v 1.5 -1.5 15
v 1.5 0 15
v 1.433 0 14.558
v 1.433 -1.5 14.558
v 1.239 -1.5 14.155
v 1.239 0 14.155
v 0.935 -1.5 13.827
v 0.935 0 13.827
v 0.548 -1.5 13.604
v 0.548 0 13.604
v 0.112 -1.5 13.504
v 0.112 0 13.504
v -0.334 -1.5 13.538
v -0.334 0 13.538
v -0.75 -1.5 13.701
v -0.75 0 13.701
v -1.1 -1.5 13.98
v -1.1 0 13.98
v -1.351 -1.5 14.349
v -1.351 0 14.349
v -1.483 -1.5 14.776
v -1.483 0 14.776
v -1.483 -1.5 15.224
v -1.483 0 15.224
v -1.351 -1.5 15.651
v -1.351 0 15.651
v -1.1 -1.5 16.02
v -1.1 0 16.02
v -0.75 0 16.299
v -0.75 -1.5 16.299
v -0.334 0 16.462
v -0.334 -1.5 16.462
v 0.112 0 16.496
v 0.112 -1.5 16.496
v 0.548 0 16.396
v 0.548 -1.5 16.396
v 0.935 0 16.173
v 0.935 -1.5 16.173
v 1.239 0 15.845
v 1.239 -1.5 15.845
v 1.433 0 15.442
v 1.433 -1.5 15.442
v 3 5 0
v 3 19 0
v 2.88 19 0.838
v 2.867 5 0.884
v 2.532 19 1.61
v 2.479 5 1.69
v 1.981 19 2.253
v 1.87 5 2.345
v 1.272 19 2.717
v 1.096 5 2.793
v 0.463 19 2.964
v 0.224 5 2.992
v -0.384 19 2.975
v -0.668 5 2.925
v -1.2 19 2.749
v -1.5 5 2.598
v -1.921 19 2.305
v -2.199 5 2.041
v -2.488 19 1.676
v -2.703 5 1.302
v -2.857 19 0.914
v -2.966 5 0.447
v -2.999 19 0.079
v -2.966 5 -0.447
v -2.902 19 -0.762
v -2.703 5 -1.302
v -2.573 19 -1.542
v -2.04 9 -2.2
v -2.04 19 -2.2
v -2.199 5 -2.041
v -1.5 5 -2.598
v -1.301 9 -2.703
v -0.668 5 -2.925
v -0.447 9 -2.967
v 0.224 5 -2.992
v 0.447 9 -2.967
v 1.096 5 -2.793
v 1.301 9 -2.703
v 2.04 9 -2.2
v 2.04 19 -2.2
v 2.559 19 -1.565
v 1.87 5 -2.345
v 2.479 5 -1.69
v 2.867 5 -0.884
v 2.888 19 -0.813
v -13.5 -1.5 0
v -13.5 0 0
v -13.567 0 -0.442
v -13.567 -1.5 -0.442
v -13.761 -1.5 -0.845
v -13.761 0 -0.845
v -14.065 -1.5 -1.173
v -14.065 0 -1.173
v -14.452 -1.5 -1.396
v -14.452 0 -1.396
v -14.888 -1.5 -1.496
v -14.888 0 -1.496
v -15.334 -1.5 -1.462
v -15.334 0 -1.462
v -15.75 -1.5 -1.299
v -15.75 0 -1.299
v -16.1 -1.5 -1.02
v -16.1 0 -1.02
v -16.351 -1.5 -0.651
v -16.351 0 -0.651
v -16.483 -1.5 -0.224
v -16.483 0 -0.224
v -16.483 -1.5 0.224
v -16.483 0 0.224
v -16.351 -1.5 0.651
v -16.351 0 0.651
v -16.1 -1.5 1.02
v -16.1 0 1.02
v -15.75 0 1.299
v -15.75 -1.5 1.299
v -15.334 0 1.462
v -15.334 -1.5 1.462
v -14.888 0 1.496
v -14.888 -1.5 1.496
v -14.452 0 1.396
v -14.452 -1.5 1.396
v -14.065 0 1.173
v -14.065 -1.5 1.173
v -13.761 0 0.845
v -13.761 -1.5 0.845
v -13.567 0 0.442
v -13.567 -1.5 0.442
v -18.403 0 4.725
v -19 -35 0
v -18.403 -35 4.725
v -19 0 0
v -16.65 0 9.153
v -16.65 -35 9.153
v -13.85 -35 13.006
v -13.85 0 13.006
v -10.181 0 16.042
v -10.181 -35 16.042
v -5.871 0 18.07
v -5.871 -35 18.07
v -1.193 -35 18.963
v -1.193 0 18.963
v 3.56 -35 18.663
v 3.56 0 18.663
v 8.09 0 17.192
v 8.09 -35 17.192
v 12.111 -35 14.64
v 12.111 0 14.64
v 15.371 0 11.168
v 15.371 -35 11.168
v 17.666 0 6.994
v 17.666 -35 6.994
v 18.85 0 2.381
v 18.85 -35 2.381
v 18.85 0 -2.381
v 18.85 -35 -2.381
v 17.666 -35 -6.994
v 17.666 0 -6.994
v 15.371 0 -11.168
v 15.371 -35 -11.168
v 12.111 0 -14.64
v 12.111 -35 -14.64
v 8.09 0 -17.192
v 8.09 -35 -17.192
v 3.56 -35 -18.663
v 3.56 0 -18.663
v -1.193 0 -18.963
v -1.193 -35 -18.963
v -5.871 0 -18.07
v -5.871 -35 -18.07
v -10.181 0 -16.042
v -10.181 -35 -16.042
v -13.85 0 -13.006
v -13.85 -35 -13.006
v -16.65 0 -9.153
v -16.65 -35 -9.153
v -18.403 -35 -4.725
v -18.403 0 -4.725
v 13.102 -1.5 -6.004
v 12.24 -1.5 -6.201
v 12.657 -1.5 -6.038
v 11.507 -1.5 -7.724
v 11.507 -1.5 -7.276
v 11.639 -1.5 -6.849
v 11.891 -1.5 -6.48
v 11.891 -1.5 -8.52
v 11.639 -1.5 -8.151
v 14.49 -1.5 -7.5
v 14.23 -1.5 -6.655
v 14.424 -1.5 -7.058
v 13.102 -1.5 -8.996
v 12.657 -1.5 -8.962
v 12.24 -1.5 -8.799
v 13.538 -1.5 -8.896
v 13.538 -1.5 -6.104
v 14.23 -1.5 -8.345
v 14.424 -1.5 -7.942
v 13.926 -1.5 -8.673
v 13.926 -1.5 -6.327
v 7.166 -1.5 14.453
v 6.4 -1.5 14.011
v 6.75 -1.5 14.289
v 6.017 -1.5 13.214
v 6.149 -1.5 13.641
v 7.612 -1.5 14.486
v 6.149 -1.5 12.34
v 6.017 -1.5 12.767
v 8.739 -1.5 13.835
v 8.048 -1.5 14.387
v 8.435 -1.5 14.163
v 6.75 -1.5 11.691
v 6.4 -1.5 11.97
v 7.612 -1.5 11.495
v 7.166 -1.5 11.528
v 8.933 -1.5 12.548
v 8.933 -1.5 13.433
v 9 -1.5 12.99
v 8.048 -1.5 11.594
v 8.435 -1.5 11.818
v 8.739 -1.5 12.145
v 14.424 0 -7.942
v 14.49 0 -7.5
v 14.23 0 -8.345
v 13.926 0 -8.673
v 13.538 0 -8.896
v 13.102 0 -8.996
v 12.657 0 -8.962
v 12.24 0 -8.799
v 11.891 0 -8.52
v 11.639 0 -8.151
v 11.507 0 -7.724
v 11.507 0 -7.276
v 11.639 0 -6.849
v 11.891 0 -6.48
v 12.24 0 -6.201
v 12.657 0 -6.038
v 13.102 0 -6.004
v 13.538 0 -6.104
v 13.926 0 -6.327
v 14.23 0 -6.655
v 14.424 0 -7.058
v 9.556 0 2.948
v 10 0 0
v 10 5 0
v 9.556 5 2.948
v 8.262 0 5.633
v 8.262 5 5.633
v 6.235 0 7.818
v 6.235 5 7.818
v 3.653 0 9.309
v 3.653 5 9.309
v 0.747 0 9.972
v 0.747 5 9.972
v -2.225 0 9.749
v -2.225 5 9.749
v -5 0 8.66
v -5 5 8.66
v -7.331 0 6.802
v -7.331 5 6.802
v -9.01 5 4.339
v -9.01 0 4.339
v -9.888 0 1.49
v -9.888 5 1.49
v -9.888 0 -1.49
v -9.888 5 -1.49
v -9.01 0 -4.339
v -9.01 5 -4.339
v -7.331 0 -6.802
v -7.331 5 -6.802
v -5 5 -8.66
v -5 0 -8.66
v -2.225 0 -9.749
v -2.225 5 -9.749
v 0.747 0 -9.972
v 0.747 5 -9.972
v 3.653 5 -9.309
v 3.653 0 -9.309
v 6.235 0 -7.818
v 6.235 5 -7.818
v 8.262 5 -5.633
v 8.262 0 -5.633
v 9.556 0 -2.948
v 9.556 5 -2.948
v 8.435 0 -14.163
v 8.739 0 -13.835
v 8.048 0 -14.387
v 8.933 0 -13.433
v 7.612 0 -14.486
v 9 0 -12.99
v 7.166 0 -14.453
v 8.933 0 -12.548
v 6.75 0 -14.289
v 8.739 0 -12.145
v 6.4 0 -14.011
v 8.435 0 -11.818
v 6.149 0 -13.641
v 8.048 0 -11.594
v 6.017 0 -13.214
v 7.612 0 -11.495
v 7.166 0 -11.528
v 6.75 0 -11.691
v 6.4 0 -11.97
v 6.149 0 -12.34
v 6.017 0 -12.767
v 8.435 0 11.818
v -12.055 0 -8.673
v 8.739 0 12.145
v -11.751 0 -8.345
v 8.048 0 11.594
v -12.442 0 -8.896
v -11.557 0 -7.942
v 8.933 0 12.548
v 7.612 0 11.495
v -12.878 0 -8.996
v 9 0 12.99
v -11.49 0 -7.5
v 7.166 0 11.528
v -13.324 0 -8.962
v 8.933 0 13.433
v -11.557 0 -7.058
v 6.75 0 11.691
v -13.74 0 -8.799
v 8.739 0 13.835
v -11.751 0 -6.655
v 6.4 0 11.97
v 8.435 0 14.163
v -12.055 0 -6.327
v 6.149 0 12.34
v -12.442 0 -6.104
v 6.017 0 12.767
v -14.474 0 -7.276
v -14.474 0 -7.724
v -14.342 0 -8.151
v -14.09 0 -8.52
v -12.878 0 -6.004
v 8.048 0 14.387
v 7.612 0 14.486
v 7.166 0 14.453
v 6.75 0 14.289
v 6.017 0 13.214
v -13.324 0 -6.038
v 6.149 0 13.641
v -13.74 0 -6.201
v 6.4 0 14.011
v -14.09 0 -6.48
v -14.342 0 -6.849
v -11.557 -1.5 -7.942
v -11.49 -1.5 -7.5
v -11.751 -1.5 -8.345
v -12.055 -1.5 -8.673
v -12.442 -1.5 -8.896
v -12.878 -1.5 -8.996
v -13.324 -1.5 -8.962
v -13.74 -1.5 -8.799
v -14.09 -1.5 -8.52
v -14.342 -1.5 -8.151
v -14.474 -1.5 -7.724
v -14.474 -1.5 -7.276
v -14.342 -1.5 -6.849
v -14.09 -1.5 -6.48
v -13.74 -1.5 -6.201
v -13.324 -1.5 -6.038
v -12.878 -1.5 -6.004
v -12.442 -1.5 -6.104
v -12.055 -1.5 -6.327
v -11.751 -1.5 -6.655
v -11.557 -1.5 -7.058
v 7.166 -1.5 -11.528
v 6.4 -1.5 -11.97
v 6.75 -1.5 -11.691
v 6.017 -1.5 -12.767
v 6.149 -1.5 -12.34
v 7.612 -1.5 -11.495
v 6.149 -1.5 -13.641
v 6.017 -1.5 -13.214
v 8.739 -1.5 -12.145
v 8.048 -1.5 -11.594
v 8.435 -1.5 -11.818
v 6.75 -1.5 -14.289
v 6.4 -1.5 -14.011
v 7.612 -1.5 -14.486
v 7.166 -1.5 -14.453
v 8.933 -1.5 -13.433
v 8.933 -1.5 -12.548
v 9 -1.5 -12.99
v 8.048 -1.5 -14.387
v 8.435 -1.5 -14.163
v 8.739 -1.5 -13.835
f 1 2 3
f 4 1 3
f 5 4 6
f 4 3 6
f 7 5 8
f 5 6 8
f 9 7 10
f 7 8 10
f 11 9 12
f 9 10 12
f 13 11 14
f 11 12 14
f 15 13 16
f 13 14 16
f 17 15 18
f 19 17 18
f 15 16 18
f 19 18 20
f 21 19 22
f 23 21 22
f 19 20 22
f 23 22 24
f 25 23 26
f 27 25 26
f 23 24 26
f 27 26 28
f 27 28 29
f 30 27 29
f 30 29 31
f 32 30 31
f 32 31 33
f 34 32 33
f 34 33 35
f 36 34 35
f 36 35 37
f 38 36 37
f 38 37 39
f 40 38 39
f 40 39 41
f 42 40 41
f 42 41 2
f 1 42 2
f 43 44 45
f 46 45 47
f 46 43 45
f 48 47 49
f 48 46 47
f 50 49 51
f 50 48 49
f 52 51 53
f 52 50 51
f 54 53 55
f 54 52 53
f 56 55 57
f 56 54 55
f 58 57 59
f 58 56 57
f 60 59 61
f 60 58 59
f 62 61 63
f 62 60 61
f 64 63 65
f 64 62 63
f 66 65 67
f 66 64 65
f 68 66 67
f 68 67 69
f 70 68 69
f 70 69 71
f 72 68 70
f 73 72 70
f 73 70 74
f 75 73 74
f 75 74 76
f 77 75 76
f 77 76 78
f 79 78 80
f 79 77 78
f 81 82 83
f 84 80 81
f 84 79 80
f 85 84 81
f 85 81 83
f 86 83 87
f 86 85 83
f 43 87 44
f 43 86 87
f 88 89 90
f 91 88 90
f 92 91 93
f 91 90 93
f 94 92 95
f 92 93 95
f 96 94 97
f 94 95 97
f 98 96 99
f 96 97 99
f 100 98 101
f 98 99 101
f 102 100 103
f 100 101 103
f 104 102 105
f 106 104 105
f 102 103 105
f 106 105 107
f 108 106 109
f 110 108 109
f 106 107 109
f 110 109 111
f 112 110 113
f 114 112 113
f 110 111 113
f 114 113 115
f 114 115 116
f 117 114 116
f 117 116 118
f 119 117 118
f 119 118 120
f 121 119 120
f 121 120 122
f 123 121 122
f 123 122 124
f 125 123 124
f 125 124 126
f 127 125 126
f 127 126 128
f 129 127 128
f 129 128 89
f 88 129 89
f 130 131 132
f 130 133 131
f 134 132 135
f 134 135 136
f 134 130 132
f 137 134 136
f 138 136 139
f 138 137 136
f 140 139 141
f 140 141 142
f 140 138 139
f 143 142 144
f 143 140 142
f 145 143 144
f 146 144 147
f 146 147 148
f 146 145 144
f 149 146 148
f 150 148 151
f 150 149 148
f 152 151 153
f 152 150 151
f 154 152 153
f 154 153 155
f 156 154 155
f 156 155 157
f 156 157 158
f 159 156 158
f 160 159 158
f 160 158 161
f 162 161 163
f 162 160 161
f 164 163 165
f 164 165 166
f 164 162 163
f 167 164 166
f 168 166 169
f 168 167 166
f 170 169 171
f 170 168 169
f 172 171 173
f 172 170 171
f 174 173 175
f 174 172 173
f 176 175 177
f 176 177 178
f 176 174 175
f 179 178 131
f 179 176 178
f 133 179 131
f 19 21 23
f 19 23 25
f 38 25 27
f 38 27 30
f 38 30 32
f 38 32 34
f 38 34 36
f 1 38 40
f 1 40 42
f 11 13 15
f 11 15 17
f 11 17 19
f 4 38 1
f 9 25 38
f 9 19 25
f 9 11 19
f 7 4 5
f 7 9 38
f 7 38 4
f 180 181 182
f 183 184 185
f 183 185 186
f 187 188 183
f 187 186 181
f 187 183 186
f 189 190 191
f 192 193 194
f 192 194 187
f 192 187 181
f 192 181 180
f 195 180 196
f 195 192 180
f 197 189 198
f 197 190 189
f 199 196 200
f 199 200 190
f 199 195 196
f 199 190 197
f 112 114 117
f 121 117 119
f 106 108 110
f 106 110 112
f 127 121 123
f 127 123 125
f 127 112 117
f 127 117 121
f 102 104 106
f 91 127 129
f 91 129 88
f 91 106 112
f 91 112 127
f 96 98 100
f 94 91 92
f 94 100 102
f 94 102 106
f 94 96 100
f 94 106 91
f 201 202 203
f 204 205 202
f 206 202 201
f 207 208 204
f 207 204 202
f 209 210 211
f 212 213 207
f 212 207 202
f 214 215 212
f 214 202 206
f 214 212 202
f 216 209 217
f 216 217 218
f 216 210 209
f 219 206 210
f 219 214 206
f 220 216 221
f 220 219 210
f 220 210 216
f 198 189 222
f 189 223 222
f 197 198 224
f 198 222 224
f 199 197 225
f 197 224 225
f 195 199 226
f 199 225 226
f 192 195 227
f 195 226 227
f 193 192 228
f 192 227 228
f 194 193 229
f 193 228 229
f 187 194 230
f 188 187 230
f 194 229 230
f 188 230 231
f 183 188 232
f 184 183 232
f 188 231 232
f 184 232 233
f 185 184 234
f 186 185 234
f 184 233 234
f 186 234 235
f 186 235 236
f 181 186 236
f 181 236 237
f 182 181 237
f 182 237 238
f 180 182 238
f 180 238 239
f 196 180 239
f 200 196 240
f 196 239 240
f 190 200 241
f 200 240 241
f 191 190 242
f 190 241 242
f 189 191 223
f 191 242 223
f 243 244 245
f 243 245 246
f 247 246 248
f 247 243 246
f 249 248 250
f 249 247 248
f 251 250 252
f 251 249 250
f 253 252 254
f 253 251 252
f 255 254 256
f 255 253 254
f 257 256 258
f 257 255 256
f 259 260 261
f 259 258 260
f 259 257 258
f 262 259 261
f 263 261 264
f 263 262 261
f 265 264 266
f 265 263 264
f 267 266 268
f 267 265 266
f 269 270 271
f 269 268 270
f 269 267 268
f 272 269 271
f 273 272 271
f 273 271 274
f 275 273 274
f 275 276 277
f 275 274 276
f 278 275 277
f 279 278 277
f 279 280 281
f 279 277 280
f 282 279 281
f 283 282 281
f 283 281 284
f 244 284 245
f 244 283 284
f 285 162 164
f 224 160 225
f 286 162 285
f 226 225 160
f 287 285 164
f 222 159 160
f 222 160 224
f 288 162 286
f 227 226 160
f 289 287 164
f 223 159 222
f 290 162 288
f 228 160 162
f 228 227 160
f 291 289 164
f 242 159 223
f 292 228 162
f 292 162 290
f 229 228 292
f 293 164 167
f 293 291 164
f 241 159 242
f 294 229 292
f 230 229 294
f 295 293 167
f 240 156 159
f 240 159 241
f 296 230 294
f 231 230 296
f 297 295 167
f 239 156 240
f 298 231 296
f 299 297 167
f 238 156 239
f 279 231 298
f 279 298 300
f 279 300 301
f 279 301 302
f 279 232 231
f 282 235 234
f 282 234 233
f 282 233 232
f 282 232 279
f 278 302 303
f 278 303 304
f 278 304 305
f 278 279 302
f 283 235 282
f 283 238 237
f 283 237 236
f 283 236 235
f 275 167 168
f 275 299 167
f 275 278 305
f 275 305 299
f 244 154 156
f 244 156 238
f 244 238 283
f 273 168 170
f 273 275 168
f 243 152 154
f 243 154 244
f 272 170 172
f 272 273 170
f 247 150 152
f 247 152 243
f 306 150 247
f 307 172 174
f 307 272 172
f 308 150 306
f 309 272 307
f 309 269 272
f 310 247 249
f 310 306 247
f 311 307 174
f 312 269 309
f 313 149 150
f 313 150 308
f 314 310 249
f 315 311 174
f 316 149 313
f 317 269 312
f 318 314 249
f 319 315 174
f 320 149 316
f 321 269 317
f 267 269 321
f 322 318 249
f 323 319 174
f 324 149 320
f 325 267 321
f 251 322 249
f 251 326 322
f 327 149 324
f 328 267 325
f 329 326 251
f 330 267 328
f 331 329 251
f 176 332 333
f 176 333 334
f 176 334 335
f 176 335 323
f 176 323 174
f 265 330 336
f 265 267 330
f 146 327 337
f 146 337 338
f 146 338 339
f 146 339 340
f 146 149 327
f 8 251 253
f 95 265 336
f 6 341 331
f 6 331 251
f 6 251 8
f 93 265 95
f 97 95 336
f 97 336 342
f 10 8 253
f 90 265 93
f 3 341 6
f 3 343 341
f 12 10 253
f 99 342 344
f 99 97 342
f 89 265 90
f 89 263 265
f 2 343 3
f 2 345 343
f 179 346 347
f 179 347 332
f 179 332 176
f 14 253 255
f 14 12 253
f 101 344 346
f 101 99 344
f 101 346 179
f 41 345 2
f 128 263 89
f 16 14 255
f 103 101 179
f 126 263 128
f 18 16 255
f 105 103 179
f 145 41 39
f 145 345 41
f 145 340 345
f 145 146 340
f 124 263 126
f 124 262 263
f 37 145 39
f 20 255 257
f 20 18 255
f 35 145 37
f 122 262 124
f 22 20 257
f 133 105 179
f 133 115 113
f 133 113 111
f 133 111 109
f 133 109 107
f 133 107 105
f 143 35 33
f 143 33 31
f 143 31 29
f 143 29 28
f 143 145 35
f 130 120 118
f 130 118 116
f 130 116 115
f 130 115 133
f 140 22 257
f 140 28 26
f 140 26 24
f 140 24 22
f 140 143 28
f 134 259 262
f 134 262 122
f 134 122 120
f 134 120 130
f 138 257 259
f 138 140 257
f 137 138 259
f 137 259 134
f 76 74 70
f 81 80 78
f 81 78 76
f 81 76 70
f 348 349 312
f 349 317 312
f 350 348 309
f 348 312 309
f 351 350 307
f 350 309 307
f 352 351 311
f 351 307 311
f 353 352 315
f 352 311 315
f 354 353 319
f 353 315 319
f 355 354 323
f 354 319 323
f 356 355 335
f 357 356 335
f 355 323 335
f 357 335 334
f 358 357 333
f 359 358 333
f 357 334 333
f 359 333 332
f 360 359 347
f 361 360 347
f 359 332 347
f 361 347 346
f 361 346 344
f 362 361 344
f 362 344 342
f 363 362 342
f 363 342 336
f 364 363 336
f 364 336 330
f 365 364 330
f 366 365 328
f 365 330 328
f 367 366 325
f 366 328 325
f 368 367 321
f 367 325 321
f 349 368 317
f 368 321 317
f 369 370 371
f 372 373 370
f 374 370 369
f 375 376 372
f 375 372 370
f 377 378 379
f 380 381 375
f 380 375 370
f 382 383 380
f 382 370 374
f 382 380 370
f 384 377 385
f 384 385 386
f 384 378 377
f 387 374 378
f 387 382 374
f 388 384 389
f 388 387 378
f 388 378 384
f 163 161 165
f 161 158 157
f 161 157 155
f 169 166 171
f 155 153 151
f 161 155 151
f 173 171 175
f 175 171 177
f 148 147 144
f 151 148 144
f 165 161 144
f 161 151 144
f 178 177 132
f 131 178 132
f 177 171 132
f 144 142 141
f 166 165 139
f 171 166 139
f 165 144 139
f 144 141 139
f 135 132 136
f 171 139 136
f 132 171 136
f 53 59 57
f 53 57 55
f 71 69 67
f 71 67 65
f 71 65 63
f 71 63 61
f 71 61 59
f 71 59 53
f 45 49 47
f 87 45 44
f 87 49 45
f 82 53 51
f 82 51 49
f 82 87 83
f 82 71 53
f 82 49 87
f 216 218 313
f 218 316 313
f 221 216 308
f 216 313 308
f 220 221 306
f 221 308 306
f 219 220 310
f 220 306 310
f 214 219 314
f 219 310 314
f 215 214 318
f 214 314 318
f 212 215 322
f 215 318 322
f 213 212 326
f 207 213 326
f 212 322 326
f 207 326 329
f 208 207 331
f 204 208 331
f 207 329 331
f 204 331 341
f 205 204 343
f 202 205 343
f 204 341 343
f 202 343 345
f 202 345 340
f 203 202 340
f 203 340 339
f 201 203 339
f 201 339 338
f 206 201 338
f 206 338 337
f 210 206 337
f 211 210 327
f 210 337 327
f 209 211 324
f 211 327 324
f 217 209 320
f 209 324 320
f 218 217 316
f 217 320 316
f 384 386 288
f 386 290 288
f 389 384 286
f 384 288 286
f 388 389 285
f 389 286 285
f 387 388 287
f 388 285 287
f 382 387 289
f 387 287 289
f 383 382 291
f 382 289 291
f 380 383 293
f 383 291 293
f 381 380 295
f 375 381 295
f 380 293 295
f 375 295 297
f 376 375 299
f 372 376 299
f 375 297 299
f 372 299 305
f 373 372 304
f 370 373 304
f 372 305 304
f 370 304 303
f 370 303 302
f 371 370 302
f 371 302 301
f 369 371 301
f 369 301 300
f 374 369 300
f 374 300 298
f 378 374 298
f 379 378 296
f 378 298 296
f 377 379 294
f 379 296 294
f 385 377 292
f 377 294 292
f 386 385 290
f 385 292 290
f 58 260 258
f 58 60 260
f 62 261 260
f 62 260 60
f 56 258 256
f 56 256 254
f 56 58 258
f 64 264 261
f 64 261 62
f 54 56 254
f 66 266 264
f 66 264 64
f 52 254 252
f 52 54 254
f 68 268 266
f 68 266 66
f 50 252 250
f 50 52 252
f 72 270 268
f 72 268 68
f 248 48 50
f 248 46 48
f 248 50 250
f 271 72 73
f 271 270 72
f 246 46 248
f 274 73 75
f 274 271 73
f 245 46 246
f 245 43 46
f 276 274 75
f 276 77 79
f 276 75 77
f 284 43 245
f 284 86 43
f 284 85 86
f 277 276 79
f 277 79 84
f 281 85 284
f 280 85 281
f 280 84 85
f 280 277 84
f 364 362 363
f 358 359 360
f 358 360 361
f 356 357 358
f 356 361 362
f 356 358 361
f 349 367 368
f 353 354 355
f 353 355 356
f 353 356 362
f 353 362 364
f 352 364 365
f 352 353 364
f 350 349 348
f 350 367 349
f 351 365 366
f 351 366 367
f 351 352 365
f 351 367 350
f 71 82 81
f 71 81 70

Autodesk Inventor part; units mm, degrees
ref_plane "YZ Plane" through (0, 0, 0) normal (1, 0, 0) x (0, 1, 0)
ref_plane "XZ Plane" through (0, 0, 0) normal (0, 1, 0) x (-1, 0, 0)
ref_plane "XY Plane" through (0, 0, 0) normal (0, 0, 1) x (1, 0, 0)
sketch "草图1" plane through (0, 0, 0) normal (0, 1, 0) x (-1, 0, 0)
  circle A0 centre (0, 0) radius 19
  circle A1 centre (0, 0) radius 10
  dimension "d0" = 38
  dimension "d1" = 20
extrude "拉伸1" add sketch "草图1" against normal blind 35 contours A0 | A1
sketch "草图2" plane through (0, 0, 0) normal (0, 1, 0) x (1, 0, 0)
  circle A0 centre (0, 0) radius 10
  circle A1 centre (0, 0) radius 15
  circle A2 centre (-15, 0) radius 1.5
  circle A3 centre (7.5, -12.9904) radius 1.5
  circle A4 centre (7.5, 12.9904) radius 1.5
  line L0 (0, 0) -> (-12.9904, 7.5)
  line L1 (0, 0) -> (15, 0) construction
  circle A5 centre (-12.9904, 7.5) radius 1.5
  circle A6 centre (0, -15) radius 1.5
  circle A7 centre (12.9904, 7.5) radius 1.5
  dimension "d4" = 20
  dimension "d5" = 30
  dimension "d6" = 3
  dimension "d9" = 360
  dimension "d11" = 150
  dimension "d12" = 3
  dimension "d15" = 360
extrude "拉伸2" cut sketch "草图2" against normal blind 1.5 contours A5 A1 L0 | L0 A1 A5 | A1 A5 | A2 A1 | A1 A2 | A4 A1 | A1 A4 | A6 A1 | A1 A6 | A7 A1 | A1 A7 | A3 A1 | A1 A3
sketch "草图3" plane through (0, 0, 0) normal (0, 1, 0) x (1, 0, 0)
  circle A0 centre (0, 0) radius 10
  dimension "d19" = 20
extrude "拉伸3" add sketch "草图3" along normal blind 5
sketch "草图4" plane through (0, 5, 0) normal (0, 1, 0) x (1, 0, 0)
  circle A0 centre (0, 0) radius 3
  dimension "d22" = 6
extrude "拉伸4" add sketch "草图4" along normal blind 14
sketch "草图5" plane through (0, 19, 0) normal (0, 1, 0) x (1, 0, 0)
  circle A0 centre (0, 0) radius 3 projected
  line L0 (0, -3) -> (0, 2.2)
  line L1 (0, 2.2) -> (-2.0396, 2.2)
  line L2 (0, 2.2) -> (2.0396, 2.2)
  dimension "d25" = 5.2
extrude "拉伸5" cut sketch "草图5" against normal blind 10 contours L2 L1 A0
thread "螺纹1" size "M3x0.5" class "6H" standard "ANSI Metric M Profile" length 1.5
thread "螺纹2" size "M3x0.5" class "6H" standard "ANSI Metric M Profile" length 1.5
thread "螺纹3" size "M3x0.5" class "6H" standard "ANSI Metric M Profile" length 1.5
thread "螺纹4" size "M3x0.5" class "6H" standard "ANSI Metric M Profile" length 1.5
thread "螺纹5" size "M3x0.5" class "6H" standard "ANSI Metric M Profile" length 1.5
thread "螺纹6" size "M3x0.5" class "6H" standard "ANSI Metric M Profile" length 1.5
properties part number "rotary_encoder"
